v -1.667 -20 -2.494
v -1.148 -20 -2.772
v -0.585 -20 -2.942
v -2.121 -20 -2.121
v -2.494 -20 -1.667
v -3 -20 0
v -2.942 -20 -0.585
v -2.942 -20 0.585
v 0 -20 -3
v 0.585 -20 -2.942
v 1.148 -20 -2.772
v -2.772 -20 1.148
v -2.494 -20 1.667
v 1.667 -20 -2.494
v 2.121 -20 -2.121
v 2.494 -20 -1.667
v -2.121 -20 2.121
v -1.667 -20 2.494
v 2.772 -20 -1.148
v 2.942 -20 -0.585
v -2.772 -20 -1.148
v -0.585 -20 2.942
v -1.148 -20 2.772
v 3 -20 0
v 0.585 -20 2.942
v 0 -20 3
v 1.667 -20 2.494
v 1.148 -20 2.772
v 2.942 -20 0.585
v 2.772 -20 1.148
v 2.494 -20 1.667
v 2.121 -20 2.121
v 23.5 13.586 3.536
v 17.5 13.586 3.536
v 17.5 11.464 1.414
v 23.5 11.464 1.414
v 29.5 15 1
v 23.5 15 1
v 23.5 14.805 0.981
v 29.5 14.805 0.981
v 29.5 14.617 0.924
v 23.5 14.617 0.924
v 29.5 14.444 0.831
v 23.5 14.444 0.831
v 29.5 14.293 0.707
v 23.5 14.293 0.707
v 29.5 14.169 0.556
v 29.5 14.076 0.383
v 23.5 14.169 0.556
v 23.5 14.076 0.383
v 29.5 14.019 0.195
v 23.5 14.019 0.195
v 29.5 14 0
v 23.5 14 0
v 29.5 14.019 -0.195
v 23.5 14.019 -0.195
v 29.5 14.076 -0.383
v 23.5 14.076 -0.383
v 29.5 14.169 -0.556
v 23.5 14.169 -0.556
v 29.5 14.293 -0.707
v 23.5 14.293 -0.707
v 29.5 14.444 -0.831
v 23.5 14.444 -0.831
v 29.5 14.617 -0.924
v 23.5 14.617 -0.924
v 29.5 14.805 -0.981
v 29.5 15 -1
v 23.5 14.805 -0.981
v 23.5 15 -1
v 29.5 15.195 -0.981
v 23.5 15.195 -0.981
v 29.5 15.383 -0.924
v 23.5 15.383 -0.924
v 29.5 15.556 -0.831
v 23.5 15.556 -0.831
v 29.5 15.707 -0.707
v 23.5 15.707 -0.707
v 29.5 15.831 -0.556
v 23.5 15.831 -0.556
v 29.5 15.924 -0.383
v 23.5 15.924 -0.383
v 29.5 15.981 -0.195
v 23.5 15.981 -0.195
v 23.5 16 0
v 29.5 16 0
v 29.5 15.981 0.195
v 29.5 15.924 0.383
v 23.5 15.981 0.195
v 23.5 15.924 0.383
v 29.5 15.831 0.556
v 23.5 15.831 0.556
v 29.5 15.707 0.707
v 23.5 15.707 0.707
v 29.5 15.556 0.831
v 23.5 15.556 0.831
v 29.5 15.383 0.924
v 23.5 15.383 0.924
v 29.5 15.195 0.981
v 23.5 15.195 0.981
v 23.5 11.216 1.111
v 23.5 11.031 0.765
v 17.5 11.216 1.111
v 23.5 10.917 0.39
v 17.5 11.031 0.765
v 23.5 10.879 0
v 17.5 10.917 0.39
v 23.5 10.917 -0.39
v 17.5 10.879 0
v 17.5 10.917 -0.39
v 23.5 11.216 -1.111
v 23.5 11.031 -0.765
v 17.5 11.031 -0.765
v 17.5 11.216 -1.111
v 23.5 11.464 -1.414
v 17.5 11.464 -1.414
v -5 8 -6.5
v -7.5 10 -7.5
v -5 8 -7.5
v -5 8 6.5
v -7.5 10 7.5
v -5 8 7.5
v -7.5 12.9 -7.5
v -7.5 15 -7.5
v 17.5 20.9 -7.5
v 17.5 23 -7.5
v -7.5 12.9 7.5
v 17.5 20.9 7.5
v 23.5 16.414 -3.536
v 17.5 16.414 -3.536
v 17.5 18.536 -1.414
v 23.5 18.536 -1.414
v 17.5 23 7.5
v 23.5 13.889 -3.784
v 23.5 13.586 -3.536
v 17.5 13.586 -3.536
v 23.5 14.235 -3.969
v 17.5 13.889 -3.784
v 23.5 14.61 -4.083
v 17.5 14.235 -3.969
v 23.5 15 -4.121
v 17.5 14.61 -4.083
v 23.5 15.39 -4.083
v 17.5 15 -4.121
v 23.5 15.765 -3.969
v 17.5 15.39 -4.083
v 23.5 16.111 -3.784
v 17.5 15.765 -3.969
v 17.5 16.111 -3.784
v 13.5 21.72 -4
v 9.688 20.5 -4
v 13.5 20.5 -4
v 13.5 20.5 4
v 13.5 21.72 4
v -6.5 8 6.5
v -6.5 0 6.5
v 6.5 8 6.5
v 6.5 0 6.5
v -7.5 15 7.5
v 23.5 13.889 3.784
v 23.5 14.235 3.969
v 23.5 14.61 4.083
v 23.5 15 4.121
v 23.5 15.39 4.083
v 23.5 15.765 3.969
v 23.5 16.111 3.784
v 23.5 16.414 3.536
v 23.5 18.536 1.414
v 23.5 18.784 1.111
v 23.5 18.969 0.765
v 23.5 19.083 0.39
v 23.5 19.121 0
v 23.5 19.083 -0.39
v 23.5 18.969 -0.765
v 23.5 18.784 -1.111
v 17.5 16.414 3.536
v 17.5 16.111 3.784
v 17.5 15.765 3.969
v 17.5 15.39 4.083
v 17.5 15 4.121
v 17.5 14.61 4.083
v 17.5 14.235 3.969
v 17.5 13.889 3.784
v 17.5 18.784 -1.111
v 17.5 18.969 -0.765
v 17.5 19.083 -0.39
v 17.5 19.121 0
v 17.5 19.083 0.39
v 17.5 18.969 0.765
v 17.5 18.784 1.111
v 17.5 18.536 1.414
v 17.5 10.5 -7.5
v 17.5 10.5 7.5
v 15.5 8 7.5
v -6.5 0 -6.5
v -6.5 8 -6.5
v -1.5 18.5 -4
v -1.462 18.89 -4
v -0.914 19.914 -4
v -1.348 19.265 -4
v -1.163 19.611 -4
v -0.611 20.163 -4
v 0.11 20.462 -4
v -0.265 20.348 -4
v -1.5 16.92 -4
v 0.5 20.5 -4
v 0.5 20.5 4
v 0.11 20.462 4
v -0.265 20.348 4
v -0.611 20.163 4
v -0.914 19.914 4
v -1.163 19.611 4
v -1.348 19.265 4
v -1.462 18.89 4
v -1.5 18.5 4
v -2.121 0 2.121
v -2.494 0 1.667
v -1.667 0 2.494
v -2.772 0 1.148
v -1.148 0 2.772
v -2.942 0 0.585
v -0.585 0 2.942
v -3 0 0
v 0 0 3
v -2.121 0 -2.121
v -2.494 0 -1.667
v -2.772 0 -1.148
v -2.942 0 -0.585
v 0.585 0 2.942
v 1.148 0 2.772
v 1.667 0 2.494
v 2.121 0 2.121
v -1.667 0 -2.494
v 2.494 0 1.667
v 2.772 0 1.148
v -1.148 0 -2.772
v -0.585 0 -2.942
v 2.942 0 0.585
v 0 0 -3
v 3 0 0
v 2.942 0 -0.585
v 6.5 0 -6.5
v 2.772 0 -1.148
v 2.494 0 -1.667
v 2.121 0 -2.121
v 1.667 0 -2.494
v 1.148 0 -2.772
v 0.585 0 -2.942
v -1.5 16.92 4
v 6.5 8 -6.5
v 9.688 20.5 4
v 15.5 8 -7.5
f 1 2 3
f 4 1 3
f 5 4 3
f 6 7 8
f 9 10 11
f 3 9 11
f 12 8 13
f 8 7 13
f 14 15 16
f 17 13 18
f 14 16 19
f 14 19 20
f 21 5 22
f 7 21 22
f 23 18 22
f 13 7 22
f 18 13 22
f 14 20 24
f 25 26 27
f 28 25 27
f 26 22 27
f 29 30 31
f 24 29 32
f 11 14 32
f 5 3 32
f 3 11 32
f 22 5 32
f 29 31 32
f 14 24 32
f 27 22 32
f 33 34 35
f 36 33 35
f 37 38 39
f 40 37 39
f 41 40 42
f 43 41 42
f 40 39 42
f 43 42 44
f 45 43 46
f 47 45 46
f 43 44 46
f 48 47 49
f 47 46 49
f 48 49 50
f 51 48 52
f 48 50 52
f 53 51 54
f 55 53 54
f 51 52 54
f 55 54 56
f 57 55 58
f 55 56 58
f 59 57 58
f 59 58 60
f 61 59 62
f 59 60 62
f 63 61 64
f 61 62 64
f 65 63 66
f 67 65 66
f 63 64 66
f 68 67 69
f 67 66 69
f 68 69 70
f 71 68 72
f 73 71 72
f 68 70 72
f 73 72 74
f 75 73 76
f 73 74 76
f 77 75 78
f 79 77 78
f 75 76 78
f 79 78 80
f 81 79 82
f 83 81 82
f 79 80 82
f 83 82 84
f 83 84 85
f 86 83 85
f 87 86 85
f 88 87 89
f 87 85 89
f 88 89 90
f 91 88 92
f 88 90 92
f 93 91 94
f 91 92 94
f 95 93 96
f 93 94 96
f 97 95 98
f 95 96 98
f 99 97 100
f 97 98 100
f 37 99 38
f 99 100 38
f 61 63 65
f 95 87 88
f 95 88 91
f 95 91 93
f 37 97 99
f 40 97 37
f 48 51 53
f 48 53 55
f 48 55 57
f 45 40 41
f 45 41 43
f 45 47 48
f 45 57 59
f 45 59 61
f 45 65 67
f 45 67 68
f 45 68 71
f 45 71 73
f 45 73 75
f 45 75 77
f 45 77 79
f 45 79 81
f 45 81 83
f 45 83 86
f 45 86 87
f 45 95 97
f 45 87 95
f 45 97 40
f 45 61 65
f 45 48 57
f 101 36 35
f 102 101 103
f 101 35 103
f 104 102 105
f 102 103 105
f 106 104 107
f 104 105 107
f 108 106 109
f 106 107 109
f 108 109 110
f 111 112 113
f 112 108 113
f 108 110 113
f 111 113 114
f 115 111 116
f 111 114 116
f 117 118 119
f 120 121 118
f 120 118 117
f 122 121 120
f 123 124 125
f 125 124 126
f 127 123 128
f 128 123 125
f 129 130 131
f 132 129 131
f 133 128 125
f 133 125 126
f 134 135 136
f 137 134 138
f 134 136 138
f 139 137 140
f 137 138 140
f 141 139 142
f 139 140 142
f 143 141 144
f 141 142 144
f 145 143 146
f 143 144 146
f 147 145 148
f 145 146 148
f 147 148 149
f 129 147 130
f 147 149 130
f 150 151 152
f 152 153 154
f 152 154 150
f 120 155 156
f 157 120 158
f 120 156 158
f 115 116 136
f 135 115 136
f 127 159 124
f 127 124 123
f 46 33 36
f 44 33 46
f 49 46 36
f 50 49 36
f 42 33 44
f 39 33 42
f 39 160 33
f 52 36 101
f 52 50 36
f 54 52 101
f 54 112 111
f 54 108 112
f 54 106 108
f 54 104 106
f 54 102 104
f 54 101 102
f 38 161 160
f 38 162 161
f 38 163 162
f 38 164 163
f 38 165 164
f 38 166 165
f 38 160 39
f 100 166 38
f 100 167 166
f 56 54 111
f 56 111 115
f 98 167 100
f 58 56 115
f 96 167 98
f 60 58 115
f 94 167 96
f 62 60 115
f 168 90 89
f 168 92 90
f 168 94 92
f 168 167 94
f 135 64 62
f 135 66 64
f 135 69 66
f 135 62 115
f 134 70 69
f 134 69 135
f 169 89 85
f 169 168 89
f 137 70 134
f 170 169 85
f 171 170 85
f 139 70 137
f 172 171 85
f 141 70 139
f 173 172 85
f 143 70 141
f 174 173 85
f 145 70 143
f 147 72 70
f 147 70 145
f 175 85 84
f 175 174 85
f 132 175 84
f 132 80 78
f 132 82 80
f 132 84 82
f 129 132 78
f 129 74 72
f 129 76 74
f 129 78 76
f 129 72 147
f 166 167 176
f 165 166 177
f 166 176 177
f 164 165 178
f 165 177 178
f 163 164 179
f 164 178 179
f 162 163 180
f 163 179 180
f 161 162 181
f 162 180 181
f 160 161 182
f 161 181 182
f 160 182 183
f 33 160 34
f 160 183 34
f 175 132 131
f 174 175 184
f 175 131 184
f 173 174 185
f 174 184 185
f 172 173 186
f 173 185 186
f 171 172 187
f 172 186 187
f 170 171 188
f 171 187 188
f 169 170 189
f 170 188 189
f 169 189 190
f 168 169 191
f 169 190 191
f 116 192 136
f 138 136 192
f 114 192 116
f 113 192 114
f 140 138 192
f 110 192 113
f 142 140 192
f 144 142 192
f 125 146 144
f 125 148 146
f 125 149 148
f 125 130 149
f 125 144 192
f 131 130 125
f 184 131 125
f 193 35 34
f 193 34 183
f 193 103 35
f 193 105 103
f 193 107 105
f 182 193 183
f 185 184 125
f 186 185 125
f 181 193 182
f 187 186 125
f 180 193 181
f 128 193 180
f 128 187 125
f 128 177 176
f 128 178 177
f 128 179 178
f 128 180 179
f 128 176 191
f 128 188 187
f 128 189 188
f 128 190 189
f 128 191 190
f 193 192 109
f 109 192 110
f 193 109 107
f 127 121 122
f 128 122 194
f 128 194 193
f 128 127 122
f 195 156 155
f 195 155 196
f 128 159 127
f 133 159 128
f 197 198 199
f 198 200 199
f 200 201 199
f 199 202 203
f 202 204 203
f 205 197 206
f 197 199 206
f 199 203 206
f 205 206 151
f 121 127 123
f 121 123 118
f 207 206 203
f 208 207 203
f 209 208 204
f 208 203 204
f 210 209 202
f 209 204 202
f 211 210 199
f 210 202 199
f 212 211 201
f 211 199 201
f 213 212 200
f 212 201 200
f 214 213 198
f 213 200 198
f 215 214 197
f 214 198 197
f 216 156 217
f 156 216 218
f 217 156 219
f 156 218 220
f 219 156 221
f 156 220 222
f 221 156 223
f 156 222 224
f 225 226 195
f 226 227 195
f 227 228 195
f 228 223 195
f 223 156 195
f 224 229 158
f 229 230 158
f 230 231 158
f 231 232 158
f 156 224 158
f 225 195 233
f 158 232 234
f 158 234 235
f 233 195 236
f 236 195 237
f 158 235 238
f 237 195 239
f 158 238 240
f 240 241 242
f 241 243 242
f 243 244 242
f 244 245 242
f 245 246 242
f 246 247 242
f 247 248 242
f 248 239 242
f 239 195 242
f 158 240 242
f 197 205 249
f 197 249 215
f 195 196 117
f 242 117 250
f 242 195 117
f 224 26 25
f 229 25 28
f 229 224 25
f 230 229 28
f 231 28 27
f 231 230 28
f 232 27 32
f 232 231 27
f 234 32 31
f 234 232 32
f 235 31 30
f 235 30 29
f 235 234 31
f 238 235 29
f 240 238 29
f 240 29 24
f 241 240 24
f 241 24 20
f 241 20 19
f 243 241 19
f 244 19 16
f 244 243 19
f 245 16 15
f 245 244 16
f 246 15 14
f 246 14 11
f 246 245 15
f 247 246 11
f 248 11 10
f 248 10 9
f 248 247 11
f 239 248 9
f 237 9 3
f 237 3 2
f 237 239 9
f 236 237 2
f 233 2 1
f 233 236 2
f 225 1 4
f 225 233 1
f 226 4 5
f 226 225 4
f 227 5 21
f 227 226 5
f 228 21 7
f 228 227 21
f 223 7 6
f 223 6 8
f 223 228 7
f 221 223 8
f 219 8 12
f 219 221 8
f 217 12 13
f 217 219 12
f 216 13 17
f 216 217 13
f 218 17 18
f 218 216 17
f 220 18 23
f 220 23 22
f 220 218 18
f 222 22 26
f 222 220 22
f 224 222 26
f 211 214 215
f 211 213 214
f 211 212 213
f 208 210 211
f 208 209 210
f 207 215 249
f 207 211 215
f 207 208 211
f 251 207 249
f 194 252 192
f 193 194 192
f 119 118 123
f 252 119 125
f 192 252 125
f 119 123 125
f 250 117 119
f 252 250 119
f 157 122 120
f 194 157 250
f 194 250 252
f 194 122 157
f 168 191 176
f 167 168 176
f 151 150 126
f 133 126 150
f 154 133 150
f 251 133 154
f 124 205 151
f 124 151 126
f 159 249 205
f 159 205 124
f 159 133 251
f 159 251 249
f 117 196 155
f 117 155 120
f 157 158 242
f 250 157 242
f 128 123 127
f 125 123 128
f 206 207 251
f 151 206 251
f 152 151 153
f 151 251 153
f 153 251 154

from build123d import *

# Parameters (mm, degrees)
ESQUISSE1_R                  = 3
BOSS_EXTRU_1_DEPTH           = 20
ESQUISSE2_W                  = 13
ESQUISSE2_H                  = 13
BOSS_EXTRU_2_DEPTH           = 8
BOSS_EXTRU_3_DEPTH           = 7.5
ESQUISSE4_W                  = 11.1875
ESQUISSE4_H                  = 3.58
BOSS_EXTRU_4_DEPTH           = 4
ESQUISSE5_W                  = 15
ESQUISSE5_H                  = 8
ENL_V_MAT_EXTRU_1_DEPTH      = 45.752094923
BOSS_EXTRU_5_DEPTH           = 6
ESQUISSE7_R                  = 1
BOSS_EXTRU_6_DEPTH           = 6
CONG_1_R                     = 2
FRACTIONNER1_SURFACE_1_BACK  = 59.677
FRACTIONNER1_SURFACE_1_DEPTH = 119.354
FRACTIONNER1_SURFACE_2_BACK  = 59.677
FRACTIONNER1_SURFACE_2_DEPTH = 119.354


with BuildPart() as part:
    # Esquisse1 → Boss.-Extru.1 (new body)
    with BuildSketch(Plane(origin=(0, 0, 0), x_dir=(1, 0, 0), z_dir=(0, 1, 0))):
        with Locations(Location((0, 0, 0), (0, 0, 270))):
            Circle(ESQUISSE1_R)
    extrude(amount=-BOSS_EXTRU_1_DEPTH)

    # Esquisse2 → Boss.-Extru.2 (add)
    with BuildSketch(Plane(origin=(0, 0, 0), x_dir=(1, 0, 0), z_dir=(0, 1, 0))):
        Rectangle(ESQUISSE2_W, ESQUISSE2_H)
    extrude(amount=BOSS_EXTRU_2_DEPTH)

    # Esquisse3 → Boss.-Extru.3 (add, symmetric)
    with BuildSketch(Plane.XY):
        Polygon((-7.5, 15), (-7.5, 10), (-5, 8), (15.5, 8), (17.5, 10.5), (17.5, 23), align=None)
    extrude(amount=BOSS_EXTRU_3_DEPTH, both=True)

    # Esquisse4 → Boss.-Extru.4 (add, symmetric)
    with BuildSketch(Plane.XY):
        with Locations((4.09375, 18.71)):
            Rectangle(ESQUISSE4_W, ESQUISSE4_H)
    extrude(amount=BOSS_EXTRU_4_DEPTH, both=True)

    # Esquisse5 → Enlèv. mat.-Extru.1 (cut, through all)
    with BuildSketch(Plane(origin=(0, 20.5, 0), x_dir=(1, 0, 0), z_dir=(0, 1, 0))):
        with Locations((6, 0)):
            Rectangle(ESQUISSE5_W, ESQUISSE5_H)
    extrude(amount=ENL_V_MAT_EXTRU_1_DEPTH, mode=Mode.SUBTRACT)

    # Esquisse6 → Boss.-Extru.5 (add)
    with BuildSketch(Plane(origin=(17.5, 0, 0), x_dir=(0, 0, -1), z_dir=(1, 0, 0))):
        Polygon((-4.949747468, 15), (0, 10.050252532), (4.949747468, 15), (0, 19.949747468), align=None)
    extrude(amount=BOSS_EXTRU_5_DEPTH)

    # Esquisse7 → Boss.-Extru.6 (add)
    with BuildSketch(Plane(origin=(23.5, 0, 0), x_dir=(0, 0, -1), z_dir=(1, 0, 0))):
        with Locations(Location((0, 15, 0), (0, 0, 180))):
            Circle(ESQUISSE7_R)
    extrude(amount=BOSS_EXTRU_6_DEPTH)

    # Congé1
    # the kernel refuses this fillet: 2 mm, written as the material it takes off along each edge
    with BuildSketch(Plane(origin=(-1.5, 20.5, -9), x_dir=(0, -1, 0), z_dir=(0, 0, 1))) as cong_1_piece_1:
        with BuildLine():
            CenterArc((CONG_1_R, CONG_1_R), CONG_1_R, 180, 90)
            Line((0, CONG_1_R), (0, 0))
            Line((0, 0), (CONG_1_R, 0))
        make_face()
    extrude(amount=18, mode=Mode.SUBTRACT)
    with BuildSketch(Plane(origin=(17.5, 19.949747468, 0), x_dir=(0, -0.7071067811865478, -0.7071067811865475), z_dir=(1, 0, 0)), Plane(origin=(17.5, 15, 4.949747468), x_dir=(0, 0.707106781186548, -0.7071067811865471), z_dir=(1, 0, 0)), Plane(origin=(17.5, 15, -4.949747468), x_dir=(0, -0.7071067811865478, 0.7071067811865474), z_dir=(1, 0, 0))) as cong_1_piece_2:
        with BuildLine():
            CenterArc((CONG_1_R, -CONG_1_R), CONG_1_R, 90, 90)
            Line((0, -CONG_1_R), (0, 0))
            Line((0, 0), (CONG_1_R, 0))
        make_face()
    extrude(amount=11, mode=Mode.SUBTRACT)
    with BuildSketch(Plane(origin=(17.5, 10.050252532, 0), x_dir=(0, 0.7071067811865479, -0.7071067811865474), z_dir=(1, 0, 0))) as cong_1_piece_3:
        with BuildLine():
            CenterArc((CONG_1_R, CONG_1_R), CONG_1_R, 180, 90)
            Line((0, CONG_1_R), (0, 0))
            Line((0, 0), (CONG_1_R, 0))
        make_face()
    extrude(amount=11, mode=Mode.SUBTRACT)


with BuildPart() as body_2:
    # Fractionner1: the piece behind the surface
    add(part.part)
    # Fractionner1 surface: a surface, the sketch's curves swept straight by 119.354 mm
    with BuildLine(Plane.XY.offset(7.5).offset(-FRACTIONNER1_SURFACE_1_BACK), mode=Mode.PRIVATE) as fractionner1_surface_1_path:
        Line((-7.5, 12.90009524), (17.5, 20.90009524))
    fractionner1_surface_1 = Shell.extrude(fractionner1_surface_1_path.wire(), (0 * FRACTIONNER1_SURFACE_1_DEPTH, 0 * FRACTIONNER1_SURFACE_1_DEPTH, 1 * FRACTIONNER1_SURFACE_1_DEPTH))
    split(bisect_by=fractionner1_surface_1, keep=Keep.BOTTOM)


with BuildPart() as part_1:
    add(part.part)

    # Fractionner1: split by a surface, the side it looks to stays
    # Fractionner1 surface: a surface, the sketch's curves swept straight by 119.354 mm
    with BuildLine(Plane.XY.offset(7.5).offset(-FRACTIONNER1_SURFACE_2_BACK), mode=Mode.PRIVATE) as fractionner1_surface_2_path:
        Line((-7.5, 12.90009524), (17.5, 20.90009524))
    fractionner1_surface_2 = Shell.extrude(fractionner1_surface_2_path.wire(), (0 * FRACTIONNER1_SURFACE_2_DEPTH, 0 * FRACTIONNER1_SURFACE_2_DEPTH, 1 * FRACTIONNER1_SURFACE_2_DEPTH))
    split(bisect_by=fractionner1_surface_2, keep=Keep.TOP)


solid = Compound([body_2.part, part_1.part])
